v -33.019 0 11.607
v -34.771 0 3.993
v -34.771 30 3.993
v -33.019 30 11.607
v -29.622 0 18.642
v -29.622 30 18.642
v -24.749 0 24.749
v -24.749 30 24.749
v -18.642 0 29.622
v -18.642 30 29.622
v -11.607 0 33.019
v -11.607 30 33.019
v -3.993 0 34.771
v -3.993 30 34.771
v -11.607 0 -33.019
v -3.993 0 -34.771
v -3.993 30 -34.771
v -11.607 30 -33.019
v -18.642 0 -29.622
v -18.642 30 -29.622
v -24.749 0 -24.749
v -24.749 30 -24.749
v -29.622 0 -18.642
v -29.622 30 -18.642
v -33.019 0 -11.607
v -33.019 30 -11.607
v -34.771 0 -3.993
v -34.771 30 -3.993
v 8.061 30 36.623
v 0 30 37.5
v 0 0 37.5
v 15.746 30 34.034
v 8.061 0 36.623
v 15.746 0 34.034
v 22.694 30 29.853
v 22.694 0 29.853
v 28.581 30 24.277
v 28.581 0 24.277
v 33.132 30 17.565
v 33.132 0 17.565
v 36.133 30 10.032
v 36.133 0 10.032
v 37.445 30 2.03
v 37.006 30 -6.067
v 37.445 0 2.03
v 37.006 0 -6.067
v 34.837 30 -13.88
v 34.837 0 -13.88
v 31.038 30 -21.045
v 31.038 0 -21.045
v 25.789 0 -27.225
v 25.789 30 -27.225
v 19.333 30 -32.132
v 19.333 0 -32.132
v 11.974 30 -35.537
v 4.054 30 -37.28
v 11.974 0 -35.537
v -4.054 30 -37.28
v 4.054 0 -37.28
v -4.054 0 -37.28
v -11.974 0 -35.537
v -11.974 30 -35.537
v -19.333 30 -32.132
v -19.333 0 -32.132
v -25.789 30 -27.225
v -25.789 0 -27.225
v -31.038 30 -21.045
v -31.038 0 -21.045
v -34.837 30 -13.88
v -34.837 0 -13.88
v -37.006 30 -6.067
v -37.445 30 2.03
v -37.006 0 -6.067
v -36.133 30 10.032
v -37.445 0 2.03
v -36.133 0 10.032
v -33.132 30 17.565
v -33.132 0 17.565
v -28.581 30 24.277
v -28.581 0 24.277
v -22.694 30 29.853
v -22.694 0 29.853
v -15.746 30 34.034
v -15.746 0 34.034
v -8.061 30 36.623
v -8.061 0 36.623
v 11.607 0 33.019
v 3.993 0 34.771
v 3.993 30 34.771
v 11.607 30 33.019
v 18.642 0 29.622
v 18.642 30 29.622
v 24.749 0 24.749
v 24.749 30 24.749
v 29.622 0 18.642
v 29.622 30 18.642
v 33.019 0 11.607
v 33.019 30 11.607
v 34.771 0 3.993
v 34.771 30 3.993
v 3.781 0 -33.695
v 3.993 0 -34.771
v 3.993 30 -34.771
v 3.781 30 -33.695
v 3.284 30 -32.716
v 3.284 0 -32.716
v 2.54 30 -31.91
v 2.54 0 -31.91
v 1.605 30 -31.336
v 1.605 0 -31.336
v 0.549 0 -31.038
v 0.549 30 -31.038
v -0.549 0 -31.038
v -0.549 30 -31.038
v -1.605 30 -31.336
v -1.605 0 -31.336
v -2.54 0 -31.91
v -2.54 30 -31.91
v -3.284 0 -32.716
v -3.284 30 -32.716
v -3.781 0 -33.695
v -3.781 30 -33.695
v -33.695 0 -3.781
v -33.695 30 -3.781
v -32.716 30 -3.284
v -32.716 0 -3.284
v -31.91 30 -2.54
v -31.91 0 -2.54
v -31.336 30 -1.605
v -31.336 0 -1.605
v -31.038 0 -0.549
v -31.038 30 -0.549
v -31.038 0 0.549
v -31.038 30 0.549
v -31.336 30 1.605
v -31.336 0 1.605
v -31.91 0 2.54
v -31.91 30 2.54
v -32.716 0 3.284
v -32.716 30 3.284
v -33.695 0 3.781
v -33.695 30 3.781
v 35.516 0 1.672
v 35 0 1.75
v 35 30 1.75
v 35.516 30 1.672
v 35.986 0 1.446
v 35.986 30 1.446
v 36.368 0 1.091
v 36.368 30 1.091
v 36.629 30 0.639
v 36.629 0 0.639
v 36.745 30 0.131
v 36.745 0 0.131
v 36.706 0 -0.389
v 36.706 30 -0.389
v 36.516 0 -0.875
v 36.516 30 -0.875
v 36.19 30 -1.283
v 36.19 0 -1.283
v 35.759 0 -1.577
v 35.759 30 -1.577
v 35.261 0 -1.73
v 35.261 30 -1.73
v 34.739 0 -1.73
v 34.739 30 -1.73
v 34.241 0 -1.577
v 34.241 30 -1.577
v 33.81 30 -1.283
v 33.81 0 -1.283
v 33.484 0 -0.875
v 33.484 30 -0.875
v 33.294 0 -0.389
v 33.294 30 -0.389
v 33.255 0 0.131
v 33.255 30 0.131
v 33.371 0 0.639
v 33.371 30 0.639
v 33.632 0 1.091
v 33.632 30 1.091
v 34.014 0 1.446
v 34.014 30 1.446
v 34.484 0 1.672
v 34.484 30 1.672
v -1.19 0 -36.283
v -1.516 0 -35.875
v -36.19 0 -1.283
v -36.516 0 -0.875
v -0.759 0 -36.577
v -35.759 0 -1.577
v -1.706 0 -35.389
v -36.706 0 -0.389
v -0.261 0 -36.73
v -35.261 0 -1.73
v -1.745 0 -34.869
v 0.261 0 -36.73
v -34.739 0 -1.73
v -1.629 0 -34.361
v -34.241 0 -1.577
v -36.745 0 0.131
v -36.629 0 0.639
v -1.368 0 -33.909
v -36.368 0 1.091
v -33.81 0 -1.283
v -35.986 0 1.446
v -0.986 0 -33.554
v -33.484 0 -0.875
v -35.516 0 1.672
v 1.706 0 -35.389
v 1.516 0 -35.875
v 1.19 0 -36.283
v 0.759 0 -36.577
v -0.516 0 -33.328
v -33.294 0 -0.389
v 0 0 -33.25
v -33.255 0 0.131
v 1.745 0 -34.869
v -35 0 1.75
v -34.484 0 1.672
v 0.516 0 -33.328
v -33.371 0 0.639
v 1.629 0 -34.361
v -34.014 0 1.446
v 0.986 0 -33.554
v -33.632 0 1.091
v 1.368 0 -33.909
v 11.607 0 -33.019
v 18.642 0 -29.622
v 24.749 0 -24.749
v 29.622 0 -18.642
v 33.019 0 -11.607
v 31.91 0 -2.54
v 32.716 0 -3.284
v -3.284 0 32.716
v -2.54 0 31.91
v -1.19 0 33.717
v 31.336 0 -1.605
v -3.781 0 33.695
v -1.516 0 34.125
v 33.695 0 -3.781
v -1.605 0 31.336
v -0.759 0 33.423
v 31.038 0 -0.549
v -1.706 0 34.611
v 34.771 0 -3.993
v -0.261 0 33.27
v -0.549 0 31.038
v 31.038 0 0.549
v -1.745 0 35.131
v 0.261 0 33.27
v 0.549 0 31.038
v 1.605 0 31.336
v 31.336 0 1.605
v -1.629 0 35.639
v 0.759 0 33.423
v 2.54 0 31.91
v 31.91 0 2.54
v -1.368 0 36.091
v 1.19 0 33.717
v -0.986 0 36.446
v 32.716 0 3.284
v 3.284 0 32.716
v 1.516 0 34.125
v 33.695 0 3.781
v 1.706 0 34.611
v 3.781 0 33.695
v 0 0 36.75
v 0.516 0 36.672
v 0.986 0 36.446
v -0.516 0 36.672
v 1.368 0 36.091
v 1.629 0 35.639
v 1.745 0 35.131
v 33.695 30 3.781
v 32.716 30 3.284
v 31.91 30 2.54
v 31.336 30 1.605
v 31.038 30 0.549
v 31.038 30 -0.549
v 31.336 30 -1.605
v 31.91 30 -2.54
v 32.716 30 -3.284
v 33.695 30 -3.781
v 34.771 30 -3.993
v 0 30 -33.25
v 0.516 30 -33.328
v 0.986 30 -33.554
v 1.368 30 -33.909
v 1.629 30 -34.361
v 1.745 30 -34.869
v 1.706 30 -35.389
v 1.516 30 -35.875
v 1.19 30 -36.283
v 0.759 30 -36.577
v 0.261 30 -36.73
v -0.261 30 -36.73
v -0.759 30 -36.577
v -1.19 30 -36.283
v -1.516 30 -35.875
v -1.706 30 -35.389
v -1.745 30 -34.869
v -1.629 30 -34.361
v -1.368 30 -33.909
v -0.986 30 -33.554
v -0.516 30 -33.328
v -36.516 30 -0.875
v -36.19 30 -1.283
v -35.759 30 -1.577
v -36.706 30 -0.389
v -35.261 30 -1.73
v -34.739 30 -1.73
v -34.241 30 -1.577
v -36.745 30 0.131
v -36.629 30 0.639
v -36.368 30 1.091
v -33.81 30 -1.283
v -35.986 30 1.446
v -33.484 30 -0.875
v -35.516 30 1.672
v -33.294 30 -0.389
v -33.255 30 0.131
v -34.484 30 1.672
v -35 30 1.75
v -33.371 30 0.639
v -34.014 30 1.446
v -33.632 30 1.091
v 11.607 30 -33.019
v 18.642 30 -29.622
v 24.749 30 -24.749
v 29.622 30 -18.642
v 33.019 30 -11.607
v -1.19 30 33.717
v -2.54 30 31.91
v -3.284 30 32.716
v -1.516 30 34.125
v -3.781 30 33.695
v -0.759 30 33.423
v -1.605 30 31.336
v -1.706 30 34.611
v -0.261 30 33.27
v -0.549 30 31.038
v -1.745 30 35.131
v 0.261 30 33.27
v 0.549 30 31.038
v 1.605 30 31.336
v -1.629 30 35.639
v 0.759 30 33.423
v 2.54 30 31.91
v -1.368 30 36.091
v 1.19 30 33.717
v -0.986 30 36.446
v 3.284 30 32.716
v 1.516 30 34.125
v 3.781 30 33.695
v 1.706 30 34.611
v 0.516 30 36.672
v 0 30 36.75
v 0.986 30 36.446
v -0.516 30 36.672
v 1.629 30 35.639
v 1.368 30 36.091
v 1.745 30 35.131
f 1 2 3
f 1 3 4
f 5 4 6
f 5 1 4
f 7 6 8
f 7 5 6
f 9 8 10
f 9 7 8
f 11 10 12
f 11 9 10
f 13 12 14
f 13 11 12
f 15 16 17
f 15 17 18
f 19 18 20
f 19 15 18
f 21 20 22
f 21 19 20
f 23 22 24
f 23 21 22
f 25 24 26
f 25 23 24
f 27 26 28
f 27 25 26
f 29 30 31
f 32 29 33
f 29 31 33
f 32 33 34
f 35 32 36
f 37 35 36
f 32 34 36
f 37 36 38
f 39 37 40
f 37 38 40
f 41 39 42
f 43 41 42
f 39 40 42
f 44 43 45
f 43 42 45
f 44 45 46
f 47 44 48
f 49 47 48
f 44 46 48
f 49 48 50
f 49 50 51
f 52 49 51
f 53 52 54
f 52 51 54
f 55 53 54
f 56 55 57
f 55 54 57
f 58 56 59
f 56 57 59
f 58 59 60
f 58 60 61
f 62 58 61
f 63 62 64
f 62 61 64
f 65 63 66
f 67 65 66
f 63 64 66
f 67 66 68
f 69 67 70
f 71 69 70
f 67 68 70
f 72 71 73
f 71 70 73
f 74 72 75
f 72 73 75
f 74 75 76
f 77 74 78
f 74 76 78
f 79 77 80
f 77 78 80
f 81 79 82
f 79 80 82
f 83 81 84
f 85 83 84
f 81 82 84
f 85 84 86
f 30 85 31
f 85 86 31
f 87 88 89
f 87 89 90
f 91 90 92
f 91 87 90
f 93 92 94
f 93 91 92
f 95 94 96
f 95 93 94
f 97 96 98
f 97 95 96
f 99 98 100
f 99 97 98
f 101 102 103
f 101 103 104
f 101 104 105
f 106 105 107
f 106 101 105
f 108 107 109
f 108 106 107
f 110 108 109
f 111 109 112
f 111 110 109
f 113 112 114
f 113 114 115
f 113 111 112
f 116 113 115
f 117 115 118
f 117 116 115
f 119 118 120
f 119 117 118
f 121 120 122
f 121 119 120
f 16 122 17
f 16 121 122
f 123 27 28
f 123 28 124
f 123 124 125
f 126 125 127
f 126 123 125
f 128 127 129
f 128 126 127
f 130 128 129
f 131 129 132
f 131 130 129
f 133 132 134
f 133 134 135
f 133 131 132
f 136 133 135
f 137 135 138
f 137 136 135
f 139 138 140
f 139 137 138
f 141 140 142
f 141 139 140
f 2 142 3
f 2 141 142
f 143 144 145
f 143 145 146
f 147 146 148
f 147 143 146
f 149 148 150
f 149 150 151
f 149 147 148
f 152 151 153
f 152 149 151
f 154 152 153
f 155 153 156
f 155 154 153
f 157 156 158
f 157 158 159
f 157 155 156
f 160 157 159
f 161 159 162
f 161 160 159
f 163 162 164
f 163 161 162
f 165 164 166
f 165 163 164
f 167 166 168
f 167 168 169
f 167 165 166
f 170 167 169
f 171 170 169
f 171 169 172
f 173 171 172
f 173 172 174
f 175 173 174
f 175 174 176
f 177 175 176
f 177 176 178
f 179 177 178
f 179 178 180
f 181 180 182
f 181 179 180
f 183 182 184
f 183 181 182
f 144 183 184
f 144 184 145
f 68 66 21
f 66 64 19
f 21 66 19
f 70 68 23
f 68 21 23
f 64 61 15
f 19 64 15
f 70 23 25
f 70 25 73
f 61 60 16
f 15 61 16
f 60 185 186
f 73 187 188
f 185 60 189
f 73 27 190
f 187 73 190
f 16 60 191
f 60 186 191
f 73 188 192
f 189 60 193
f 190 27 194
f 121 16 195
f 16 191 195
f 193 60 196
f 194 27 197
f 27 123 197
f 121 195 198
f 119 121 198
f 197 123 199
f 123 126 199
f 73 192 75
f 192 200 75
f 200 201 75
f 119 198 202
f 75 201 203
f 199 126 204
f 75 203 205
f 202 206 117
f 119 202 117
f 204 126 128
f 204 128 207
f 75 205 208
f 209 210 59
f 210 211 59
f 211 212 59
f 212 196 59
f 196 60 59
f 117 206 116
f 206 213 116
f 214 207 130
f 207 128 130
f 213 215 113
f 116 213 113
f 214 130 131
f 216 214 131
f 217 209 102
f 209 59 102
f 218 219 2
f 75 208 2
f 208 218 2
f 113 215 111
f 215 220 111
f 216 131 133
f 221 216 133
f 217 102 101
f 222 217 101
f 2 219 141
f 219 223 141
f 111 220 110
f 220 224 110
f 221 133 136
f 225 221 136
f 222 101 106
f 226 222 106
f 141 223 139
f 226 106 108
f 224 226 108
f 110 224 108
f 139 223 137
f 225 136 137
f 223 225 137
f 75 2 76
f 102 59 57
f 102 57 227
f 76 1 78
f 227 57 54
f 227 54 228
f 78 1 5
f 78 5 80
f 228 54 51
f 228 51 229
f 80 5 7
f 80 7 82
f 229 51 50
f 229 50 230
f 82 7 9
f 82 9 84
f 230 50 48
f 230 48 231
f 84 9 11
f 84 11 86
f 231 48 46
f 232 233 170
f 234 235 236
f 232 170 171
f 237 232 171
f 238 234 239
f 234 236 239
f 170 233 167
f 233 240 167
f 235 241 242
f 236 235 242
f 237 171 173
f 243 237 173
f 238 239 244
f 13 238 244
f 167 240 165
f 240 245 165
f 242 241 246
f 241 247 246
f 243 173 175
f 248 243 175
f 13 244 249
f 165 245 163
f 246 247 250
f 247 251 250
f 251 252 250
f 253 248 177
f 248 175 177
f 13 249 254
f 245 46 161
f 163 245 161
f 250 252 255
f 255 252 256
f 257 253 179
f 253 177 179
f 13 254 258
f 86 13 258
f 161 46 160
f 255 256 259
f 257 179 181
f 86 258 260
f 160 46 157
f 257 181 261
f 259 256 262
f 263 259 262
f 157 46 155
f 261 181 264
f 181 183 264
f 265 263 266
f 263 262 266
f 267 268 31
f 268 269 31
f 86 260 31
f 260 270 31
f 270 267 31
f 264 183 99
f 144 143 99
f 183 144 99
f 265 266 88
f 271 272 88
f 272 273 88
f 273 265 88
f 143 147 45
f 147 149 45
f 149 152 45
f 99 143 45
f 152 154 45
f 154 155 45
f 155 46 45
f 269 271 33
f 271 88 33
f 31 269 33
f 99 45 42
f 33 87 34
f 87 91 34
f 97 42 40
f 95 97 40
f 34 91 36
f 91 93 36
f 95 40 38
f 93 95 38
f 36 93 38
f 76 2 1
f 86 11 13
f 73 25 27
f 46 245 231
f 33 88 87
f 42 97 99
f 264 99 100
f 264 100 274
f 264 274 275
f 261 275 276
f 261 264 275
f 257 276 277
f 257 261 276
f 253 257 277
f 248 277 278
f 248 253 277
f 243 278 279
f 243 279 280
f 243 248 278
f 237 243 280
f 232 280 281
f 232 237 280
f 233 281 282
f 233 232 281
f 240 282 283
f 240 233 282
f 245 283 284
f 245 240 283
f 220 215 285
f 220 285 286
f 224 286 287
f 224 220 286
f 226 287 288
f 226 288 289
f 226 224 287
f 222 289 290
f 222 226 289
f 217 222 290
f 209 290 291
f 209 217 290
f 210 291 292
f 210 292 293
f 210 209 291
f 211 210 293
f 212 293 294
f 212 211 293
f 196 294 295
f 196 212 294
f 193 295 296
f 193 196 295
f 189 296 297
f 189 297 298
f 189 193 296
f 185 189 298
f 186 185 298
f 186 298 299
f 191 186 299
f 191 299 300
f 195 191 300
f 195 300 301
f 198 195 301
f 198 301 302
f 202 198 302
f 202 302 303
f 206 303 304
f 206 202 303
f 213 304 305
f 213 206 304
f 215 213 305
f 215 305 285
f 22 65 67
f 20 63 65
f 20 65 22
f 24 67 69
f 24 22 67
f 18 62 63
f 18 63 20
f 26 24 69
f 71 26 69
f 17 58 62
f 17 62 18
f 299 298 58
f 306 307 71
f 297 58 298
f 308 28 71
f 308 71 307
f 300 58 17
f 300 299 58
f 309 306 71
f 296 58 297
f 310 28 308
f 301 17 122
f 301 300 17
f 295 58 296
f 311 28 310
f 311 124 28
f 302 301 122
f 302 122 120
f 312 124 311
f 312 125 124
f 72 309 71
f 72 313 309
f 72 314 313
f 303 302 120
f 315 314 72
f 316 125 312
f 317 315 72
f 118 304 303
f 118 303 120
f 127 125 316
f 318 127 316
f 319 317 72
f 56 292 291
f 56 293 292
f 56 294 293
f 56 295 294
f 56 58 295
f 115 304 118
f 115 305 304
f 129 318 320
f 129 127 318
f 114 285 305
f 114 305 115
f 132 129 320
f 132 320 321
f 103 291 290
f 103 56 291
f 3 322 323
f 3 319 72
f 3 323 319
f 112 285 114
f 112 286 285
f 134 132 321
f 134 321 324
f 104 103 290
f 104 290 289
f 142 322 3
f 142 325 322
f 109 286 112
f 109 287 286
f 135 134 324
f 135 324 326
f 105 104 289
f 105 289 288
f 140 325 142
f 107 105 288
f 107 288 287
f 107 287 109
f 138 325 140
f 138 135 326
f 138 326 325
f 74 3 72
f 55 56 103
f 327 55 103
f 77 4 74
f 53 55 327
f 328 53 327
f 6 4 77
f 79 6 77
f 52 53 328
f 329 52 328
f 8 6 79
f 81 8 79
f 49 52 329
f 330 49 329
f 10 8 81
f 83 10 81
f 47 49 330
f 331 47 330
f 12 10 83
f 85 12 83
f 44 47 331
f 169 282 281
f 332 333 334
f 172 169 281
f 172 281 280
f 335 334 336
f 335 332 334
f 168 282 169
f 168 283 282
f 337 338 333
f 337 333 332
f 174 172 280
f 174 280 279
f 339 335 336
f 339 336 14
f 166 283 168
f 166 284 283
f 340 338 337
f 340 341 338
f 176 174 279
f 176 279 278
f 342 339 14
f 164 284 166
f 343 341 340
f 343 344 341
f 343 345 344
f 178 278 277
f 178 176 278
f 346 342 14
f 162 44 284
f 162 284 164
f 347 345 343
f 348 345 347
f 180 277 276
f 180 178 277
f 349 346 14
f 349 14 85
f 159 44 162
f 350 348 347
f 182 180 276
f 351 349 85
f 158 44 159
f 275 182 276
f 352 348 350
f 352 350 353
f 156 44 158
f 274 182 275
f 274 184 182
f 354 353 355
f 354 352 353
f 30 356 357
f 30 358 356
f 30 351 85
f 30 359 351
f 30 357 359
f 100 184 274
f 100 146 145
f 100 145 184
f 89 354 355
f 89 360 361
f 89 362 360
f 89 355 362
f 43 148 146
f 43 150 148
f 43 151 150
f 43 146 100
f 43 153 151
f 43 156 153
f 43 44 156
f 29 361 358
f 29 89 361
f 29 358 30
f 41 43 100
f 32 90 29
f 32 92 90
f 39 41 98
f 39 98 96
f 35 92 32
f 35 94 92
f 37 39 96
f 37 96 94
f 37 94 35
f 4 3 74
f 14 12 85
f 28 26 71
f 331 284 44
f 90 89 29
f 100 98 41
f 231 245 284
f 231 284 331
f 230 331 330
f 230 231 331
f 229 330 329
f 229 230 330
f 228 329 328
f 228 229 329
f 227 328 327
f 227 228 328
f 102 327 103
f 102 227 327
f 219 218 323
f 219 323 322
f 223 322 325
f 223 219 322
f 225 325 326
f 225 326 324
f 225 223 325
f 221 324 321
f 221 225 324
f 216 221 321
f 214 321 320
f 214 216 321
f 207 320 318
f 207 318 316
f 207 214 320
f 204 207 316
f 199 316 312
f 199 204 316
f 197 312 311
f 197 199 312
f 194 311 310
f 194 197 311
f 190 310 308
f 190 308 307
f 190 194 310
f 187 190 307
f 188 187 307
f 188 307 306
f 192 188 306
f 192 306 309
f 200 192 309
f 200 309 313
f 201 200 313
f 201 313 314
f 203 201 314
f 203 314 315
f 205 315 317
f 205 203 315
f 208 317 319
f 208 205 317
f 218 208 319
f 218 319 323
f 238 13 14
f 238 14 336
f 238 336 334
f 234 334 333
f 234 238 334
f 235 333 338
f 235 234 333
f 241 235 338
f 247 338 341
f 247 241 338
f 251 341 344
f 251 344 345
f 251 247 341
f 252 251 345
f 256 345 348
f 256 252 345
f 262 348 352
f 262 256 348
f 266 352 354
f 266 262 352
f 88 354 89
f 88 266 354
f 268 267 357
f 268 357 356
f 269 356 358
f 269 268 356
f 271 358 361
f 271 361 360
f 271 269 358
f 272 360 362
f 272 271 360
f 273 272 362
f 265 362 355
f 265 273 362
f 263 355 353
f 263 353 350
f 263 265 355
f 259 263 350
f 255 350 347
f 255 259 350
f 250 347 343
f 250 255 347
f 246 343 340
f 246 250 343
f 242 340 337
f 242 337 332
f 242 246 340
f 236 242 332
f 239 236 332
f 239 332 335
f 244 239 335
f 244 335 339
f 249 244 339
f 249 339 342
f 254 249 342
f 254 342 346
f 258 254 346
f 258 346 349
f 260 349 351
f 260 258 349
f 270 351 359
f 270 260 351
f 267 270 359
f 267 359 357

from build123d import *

# Parameters (mm, degrees)
IZIM1_R                     = 37.5
IZIM1_R_2                   = 1.75
Y_KSEKLIK_EKSTR_ZYON1_DEPTH = 30


with BuildPart() as part:
    # Çizim1 → Yükseklik-Ekstrüzyon1 (new body)
    with BuildSketch(Plane(origin=(0, 0, 0), x_dir=(1, 0, 0), z_dir=(0, 1, 0))):
        with Locations(Location((0, 0, 0), (0, 0, 270))):
            Circle(IZIM1_R)
        with Locations(Location((0, 35, 0), (0, 0, 270))):
            Circle(IZIM1_R_2, mode=Mode.SUBTRACT)
        with Locations(Location((35, 0, 0), (0, 0, 270))):
            Circle(IZIM1_R_2, mode=Mode.SUBTRACT)
        with Locations(Location((0, -35, 0), (0, 0, 270))):
            Circle(IZIM1_R_2, mode=Mode.SUBTRACT)
        with Locations(Location((-35, 0, 0), (0, 0, 270))):
            Circle(IZIM1_R_2, mode=Mode.SUBTRACT)
        with BuildLine():
            ThreePointArc((-34.771428571, -3.993464048), (-24.748737342, -24.748737342), (-3.993464048, -34.771428571))
            ThreePointArc((-3.993464048, -34.771428571), (0, -31), (3.993464048, -34.771428571))
            ThreePointArc((3.993464048, -34.771428571), (24.748737342, -24.748737342), (34.771428571, -3.993464048))
            ThreePointArc((34.771428571, -3.993464048), (31, 0), (34.771428571, 3.993464048))
            ThreePointArc((34.771428571, 3.993464048), (24.748737342, 24.748737342), (3.993464048, 34.771428571))
            ThreePointArc((3.993464048, 34.771428571), (0, 31), (-3.993464048, 34.771428571))
            ThreePointArc((-3.993464048, 34.771428571), (-24.748737342, 24.748737342), (-34.771428571, 3.993464048))
            ThreePointArc((-34.771428571, 3.993464048), (-31, 0), (-34.771428571, -3.993464048))
        make_face(mode=Mode.SUBTRACT)
    extrude(amount=Y_KSEKLIK_EKSTR_ZYON1_DEPTH)


solid = part.part
